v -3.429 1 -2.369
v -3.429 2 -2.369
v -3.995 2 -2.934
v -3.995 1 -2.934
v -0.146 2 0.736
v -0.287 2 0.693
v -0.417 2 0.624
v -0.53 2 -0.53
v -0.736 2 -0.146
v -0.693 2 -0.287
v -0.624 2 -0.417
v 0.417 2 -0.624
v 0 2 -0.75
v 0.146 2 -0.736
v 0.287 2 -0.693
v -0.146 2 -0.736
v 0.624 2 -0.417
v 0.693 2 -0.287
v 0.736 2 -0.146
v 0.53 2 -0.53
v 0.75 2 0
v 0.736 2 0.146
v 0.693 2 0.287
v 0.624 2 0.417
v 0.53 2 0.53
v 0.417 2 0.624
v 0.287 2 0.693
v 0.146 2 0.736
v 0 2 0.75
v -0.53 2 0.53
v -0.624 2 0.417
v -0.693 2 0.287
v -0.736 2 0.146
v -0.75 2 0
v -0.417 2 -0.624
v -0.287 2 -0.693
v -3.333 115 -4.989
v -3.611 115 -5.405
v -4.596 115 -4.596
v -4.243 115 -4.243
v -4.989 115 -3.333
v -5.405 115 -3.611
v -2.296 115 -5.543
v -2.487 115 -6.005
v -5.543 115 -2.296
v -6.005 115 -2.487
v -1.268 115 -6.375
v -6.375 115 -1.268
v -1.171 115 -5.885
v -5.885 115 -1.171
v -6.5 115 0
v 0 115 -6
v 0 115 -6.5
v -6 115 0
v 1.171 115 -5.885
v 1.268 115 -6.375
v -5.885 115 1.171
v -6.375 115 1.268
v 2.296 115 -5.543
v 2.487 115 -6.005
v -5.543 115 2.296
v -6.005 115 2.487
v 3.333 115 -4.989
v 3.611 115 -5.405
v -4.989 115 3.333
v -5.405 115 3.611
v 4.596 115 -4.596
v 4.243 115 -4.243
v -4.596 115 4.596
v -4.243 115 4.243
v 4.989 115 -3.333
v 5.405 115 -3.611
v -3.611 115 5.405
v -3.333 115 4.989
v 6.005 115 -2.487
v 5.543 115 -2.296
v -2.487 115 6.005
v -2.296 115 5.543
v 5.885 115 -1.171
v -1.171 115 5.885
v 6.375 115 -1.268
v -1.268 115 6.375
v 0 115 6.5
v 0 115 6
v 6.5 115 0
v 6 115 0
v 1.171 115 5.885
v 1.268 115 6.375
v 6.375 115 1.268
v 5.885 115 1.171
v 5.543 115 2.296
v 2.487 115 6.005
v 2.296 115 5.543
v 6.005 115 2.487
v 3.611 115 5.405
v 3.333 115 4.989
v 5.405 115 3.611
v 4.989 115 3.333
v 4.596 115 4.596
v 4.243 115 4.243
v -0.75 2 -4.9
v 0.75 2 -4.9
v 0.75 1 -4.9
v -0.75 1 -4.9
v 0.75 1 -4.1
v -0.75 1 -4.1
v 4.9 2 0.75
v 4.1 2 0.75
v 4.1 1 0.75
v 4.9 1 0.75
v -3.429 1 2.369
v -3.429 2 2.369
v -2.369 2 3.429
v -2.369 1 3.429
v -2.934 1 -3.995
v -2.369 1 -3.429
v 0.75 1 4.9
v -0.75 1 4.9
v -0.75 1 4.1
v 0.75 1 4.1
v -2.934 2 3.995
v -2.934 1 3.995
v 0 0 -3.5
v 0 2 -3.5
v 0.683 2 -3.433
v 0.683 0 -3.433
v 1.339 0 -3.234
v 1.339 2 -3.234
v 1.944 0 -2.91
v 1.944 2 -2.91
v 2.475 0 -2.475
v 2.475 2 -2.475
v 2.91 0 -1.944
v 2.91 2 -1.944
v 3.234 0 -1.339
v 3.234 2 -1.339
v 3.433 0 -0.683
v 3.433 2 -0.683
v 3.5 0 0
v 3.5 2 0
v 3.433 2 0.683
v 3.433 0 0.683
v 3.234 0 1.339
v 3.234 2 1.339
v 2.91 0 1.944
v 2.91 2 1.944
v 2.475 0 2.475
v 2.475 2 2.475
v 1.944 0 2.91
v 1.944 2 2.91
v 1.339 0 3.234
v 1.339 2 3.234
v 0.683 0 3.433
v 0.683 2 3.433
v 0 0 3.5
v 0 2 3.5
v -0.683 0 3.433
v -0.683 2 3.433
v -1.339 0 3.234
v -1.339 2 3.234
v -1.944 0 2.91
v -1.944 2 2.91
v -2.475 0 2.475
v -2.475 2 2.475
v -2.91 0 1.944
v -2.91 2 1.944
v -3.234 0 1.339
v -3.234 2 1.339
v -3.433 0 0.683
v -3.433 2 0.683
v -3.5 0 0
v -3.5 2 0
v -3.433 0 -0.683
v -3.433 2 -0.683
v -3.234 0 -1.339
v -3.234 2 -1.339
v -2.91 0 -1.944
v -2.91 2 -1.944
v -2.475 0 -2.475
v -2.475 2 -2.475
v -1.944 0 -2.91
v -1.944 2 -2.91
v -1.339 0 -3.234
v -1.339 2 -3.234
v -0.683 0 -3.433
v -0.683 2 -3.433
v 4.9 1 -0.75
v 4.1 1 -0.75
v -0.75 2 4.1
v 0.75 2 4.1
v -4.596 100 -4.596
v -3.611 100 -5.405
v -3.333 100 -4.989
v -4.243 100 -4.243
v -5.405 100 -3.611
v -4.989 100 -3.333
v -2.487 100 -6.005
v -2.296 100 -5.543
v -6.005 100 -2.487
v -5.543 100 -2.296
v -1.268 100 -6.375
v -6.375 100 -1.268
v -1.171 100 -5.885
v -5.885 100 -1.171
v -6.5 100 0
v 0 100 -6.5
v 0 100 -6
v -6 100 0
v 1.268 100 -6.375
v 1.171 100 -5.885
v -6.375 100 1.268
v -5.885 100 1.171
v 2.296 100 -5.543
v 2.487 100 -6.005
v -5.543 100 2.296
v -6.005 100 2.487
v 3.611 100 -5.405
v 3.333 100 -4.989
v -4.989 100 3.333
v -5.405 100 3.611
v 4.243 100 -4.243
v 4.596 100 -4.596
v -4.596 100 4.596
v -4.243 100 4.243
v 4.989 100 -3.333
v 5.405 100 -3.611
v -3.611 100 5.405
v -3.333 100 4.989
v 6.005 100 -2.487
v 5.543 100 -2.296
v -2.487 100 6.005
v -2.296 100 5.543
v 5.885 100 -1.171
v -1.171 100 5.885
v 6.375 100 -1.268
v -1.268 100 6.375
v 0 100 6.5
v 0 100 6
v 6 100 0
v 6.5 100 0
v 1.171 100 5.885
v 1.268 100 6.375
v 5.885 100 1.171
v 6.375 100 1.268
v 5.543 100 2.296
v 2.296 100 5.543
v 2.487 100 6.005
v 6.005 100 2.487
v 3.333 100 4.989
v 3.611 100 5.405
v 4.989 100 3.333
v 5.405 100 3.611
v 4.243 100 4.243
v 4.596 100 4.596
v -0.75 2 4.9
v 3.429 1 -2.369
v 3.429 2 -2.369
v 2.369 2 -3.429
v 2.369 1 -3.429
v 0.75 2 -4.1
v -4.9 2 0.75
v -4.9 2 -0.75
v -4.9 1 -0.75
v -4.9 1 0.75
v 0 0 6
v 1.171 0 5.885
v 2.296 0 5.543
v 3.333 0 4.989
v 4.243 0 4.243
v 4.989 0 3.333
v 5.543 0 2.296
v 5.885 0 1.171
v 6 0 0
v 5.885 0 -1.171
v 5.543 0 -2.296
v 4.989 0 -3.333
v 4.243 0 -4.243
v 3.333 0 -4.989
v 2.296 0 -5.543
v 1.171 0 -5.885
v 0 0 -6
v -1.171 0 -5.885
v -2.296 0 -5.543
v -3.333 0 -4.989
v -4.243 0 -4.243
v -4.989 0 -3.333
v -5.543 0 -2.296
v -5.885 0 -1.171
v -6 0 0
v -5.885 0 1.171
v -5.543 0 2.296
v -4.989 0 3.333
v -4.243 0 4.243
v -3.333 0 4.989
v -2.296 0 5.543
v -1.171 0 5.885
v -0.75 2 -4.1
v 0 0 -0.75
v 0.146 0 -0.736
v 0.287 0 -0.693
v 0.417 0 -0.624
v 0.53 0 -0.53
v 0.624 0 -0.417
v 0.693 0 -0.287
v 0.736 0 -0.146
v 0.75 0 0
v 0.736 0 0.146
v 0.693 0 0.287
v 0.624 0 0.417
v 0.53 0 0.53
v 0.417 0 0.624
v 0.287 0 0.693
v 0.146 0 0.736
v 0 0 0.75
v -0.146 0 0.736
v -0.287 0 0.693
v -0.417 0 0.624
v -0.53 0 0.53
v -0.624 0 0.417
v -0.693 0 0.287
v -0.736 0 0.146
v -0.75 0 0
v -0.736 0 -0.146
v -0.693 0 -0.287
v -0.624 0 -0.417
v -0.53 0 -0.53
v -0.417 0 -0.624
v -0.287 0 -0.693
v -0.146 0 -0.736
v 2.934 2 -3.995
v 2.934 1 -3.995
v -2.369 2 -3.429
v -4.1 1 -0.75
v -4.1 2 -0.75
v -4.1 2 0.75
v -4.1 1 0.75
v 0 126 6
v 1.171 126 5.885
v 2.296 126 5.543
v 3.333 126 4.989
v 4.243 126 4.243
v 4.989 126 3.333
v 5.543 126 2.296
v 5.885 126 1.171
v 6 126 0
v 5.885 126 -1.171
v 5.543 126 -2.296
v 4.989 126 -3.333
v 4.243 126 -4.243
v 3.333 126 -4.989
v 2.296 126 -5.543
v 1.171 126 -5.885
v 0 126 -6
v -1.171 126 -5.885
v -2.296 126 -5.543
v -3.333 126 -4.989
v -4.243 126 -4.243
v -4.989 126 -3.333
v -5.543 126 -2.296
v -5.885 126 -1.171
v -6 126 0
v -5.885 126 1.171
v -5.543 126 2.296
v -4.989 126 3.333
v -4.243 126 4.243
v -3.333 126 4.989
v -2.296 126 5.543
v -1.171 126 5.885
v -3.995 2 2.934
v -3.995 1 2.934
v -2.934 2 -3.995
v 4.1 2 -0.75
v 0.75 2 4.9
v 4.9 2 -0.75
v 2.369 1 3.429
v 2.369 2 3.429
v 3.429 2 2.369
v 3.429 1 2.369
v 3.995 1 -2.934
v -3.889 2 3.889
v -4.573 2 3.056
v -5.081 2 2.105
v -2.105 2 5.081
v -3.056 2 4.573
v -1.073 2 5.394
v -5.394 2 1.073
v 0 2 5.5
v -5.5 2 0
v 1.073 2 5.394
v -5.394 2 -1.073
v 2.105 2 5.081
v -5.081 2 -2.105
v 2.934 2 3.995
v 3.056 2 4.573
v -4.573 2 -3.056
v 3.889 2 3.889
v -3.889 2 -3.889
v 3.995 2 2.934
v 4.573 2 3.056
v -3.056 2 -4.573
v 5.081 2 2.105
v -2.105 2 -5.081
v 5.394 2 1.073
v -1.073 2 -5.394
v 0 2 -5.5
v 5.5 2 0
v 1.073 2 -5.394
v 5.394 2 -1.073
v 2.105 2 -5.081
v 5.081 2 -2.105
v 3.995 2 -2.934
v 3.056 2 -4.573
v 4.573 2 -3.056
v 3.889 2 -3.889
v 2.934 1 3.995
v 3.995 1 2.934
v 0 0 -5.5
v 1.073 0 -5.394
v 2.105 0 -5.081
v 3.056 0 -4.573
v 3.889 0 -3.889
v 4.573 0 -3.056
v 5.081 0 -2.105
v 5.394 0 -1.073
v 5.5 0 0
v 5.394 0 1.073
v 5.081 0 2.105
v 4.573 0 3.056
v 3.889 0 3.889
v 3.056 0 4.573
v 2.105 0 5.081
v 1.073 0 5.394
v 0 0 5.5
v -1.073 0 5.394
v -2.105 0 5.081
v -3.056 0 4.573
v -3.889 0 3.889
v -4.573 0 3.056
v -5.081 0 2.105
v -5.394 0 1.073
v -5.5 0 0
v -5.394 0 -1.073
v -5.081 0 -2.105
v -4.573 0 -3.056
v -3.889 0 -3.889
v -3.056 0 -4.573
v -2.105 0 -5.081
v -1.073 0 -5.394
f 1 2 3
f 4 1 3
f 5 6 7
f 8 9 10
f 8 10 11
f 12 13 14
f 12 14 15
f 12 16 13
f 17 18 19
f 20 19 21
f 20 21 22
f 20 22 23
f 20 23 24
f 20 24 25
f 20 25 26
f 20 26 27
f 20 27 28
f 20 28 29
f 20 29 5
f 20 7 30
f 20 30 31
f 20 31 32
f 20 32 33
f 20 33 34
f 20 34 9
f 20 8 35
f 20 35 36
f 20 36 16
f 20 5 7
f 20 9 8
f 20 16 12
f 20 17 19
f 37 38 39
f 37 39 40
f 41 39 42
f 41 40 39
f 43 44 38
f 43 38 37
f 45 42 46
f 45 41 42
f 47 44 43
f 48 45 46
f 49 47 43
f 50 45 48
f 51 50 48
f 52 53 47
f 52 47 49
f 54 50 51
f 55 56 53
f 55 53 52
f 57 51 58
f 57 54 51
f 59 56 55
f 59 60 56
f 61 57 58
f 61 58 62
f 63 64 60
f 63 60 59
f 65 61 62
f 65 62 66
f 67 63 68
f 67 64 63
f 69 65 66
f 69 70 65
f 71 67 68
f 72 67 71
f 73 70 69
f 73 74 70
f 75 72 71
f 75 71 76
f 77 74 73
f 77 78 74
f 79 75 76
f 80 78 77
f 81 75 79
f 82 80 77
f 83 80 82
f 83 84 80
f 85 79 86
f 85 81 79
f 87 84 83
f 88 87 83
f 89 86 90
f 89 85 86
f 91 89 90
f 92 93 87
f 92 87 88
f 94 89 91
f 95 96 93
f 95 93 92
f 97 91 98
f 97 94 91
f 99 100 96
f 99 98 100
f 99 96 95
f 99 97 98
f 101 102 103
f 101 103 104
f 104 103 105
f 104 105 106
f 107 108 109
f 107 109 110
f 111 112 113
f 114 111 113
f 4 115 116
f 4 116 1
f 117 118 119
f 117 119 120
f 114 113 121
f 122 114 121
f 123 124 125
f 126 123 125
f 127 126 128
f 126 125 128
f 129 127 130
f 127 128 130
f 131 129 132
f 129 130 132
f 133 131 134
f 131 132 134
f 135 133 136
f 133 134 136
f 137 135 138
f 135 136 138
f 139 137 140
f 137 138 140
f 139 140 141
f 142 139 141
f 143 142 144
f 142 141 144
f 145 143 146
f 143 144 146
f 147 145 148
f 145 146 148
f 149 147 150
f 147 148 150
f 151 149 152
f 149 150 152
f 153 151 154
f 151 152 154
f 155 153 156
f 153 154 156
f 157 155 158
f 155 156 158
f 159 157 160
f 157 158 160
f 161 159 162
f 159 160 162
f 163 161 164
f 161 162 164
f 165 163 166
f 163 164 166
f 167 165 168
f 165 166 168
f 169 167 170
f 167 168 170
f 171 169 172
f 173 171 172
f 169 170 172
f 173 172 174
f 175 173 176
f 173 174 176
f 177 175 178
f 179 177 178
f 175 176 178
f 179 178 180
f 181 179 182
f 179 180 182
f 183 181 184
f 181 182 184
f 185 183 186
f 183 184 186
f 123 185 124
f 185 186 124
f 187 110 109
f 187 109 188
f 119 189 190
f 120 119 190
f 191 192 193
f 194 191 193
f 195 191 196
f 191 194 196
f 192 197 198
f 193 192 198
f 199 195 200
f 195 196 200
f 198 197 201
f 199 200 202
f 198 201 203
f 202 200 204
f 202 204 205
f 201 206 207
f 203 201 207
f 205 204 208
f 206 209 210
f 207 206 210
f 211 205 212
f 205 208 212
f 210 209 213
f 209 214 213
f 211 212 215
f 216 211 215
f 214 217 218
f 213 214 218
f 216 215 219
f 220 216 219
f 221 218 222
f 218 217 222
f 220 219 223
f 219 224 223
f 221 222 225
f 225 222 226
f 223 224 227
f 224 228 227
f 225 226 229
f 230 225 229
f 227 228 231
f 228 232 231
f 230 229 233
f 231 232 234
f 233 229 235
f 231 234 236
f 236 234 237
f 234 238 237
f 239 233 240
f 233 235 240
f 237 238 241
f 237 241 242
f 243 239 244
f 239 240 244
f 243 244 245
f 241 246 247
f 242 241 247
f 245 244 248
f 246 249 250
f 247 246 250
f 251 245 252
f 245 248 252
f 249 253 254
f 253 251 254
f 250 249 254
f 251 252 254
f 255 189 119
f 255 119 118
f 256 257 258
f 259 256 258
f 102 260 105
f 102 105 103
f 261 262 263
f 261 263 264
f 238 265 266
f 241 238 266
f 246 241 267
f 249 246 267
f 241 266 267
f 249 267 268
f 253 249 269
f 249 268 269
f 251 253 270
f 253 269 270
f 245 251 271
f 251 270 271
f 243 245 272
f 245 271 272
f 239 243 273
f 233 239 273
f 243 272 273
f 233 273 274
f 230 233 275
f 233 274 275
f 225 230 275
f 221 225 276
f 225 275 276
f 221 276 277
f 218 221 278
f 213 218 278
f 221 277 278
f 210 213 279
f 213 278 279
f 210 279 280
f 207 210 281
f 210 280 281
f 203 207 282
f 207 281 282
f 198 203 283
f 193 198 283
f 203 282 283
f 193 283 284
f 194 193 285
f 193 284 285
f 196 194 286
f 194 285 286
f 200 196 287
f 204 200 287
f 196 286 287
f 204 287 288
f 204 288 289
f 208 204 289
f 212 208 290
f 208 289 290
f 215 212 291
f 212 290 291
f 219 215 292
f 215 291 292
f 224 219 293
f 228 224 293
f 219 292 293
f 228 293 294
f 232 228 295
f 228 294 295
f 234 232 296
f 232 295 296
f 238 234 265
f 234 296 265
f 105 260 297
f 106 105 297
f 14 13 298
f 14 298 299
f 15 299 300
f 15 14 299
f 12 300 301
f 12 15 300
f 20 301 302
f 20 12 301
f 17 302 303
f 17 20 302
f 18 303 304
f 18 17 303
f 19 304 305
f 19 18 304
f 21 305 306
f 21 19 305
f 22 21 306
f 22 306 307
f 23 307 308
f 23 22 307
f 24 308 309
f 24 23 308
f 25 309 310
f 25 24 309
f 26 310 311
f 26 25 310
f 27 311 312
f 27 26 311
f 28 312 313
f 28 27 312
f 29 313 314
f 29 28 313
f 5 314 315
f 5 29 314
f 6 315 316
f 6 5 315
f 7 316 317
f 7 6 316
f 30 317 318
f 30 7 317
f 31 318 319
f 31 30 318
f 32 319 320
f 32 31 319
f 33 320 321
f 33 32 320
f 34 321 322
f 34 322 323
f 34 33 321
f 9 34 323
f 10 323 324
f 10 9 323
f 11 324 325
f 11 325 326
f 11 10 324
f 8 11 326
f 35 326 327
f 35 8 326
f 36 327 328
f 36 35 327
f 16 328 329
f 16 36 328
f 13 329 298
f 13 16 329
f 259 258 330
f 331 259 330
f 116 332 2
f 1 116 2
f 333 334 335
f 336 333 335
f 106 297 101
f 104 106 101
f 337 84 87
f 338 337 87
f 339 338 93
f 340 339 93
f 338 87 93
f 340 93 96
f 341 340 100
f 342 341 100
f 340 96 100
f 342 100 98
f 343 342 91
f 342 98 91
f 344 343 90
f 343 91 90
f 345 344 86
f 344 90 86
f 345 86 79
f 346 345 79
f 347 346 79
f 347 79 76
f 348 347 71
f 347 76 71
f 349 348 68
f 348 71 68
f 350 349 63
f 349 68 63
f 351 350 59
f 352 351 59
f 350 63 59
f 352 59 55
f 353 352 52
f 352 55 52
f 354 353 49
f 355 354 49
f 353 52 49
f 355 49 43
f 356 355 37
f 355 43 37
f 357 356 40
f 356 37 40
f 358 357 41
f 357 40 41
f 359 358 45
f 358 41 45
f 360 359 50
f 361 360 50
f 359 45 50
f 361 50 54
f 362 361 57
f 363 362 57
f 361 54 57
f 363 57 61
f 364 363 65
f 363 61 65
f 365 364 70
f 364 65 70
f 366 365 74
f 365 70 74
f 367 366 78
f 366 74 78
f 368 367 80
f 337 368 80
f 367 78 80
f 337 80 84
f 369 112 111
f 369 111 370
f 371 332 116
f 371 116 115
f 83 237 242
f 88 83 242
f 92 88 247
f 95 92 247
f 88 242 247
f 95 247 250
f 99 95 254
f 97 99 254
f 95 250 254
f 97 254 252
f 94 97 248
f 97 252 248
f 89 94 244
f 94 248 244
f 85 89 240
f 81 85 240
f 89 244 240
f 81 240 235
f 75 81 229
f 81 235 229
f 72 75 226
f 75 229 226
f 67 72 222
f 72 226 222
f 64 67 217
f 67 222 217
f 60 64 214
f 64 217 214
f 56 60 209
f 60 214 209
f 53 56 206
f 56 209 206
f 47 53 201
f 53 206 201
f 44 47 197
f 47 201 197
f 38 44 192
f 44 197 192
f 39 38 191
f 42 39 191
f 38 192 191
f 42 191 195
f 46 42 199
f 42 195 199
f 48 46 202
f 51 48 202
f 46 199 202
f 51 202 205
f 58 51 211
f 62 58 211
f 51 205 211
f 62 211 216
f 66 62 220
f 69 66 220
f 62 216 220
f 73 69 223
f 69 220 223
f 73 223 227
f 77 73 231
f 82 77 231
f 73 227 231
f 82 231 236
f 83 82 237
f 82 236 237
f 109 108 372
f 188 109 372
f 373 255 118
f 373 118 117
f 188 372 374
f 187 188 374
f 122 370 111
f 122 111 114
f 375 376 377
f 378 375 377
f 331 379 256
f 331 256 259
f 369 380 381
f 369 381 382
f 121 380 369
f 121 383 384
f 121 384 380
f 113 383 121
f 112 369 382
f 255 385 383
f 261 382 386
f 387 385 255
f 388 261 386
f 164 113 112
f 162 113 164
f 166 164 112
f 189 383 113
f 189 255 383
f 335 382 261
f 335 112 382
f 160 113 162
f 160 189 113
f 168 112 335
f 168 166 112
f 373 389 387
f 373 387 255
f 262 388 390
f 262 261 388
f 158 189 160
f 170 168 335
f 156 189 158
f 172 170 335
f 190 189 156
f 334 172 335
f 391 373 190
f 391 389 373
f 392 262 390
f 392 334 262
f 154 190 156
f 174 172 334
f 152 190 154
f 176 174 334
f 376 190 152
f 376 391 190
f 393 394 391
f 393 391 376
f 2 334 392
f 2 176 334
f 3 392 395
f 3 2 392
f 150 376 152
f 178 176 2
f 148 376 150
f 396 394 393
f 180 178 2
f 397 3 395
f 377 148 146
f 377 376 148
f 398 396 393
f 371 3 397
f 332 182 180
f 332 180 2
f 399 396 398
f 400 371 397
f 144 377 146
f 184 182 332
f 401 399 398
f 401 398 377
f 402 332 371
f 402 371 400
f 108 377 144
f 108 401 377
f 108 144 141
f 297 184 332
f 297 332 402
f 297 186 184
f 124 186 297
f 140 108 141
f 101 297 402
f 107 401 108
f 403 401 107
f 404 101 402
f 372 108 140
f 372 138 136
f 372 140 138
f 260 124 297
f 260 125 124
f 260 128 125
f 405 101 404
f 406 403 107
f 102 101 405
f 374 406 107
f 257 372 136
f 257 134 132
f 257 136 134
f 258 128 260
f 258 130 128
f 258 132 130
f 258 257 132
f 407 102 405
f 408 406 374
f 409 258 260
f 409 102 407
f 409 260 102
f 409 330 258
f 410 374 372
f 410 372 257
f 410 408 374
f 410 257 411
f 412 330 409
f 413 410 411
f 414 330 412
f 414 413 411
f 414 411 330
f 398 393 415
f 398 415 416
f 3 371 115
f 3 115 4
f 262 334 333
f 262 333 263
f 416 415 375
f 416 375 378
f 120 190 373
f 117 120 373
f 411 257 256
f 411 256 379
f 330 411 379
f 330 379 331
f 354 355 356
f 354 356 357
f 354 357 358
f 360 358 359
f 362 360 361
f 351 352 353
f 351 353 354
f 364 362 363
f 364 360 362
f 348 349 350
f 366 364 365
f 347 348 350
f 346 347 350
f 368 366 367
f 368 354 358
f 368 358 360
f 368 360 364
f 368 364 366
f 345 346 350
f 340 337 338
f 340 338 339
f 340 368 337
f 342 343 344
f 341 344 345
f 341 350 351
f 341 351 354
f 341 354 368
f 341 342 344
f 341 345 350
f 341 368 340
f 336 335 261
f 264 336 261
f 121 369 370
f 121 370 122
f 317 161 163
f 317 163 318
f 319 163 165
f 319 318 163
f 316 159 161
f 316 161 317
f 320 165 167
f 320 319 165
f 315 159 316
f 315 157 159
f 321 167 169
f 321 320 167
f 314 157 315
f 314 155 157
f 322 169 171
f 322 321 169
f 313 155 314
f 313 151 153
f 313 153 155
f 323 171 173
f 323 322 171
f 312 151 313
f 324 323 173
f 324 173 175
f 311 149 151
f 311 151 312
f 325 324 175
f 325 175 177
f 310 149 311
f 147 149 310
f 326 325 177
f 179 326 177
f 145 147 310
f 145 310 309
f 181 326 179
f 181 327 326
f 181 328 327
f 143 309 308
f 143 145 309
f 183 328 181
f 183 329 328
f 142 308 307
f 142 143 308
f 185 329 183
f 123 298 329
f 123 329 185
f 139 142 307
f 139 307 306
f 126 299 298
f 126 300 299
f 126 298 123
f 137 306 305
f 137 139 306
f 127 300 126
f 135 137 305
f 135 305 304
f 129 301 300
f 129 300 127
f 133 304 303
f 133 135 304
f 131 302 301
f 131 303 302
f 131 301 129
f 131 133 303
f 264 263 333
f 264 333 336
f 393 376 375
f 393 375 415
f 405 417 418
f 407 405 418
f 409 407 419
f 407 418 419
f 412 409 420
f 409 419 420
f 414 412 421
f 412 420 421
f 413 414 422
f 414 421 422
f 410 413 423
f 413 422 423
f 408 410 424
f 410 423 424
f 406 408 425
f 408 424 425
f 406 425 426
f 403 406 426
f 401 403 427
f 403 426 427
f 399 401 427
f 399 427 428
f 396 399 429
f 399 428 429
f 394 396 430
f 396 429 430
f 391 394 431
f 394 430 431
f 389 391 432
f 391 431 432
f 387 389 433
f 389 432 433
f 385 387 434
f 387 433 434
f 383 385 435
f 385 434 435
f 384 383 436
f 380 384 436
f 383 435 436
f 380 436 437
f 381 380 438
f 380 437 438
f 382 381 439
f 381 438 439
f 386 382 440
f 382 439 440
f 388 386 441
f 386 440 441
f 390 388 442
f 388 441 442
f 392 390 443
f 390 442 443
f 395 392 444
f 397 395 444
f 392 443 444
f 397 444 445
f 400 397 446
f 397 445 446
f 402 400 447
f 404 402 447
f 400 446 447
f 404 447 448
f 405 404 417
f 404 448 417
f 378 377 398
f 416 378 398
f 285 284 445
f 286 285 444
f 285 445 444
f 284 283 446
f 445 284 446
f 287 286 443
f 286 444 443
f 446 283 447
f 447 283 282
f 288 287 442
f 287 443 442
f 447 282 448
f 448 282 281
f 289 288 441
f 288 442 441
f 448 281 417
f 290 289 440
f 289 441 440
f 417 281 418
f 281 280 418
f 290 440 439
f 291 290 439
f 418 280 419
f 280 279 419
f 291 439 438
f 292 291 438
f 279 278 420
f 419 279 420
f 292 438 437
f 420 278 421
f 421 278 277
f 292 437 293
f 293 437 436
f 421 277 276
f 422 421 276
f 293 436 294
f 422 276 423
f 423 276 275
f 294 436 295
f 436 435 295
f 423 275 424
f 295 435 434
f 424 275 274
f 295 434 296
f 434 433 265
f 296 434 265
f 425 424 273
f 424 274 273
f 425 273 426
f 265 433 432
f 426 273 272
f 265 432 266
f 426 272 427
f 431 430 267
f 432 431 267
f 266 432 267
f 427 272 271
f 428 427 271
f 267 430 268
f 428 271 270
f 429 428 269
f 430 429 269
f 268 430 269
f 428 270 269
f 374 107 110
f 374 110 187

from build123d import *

# Parameters (mm, degrees)
SKETCH_1_R               = 6
EXTRUDE_1015_DEPTH       = 100
SKETCH_2_R               = 6.5
EXTRUDE_2_DEPTH          = 15
SKETCH_3_R               = 6
EXTRUDE_3_DEPTH          = 11
SKETCH_4_R               = 5.5
CUT_EXTRUDE_1_DEPTH      = 2
SKETCH_5_R               = 3.5
SKETCH_5_R_2             = 0.75
EXTRUDE_1402_DEPTH       = 2
SKETCH_6_W               = 1.5
SKETCH_6_H               = 0.8
EXTRUDE_1605_DEPTH       = 1
PATTERN_CIRCULAR_1_COUNT = 8


with BuildPart() as part:
    # Эскиз1 → Extrude 1015 (new body)
    with BuildSketch(Plane(origin=(0, 0, 0), x_dir=(1, 0, 0), z_dir=(0, 1, 0))):
        with Locations(Location((0, 0, 0), (0, 0, 270))):
            Circle(SKETCH_1_R)
    extrude(amount=EXTRUDE_1015_DEPTH)

    # Эскиз2 → Бобышка-Вытянуть2 (add)
    with BuildSketch(Plane(origin=(0, 100, 0), x_dir=(1, 0, 0), z_dir=(0, 1, 0))):
        with Locations(Location((0, 0, 0), (0, 0, 270))):
            Circle(SKETCH_2_R)
    extrude(amount=EXTRUDE_2_DEPTH)

    # Эскиз3 → Бобышка-Вытянуть3 (add)
    with BuildSketch(Plane(origin=(0, 115, 0), x_dir=(1, 0, 0), z_dir=(0, 1, 0))):
        with Locations(Location((0, 0, 0), (0, 0, 270))):
            Circle(SKETCH_3_R)
    extrude(amount=EXTRUDE_3_DEPTH)

    # Эскиз4 → Вырез-Вытянуть1 (cut)
    with BuildSketch(Plane.XZ):
        with Locations(Location((0, 0, 0), (0, 0, 270))):
            Circle(SKETCH_4_R)
    extrude(amount=-CUT_EXTRUDE_1_DEPTH, mode=Mode.SUBTRACT)

    # Эскиз5 → Extrude 1402 (add)
    with BuildSketch(Plane.XZ.offset(-2)):
        with Locations(Location((0, 0, 0), (0, 0, 270))):
            Circle(SKETCH_5_R)
        with Locations(Location((0, 0, 0), (0, 0, 270))):
            Circle(SKETCH_5_R_2, mode=Mode.SUBTRACT)
    extrude(amount=EXTRUDE_1402_DEPTH)

    # Эскиз6 → Extrude 1605 (add)
    with BuildSketch(Plane.XZ.offset(-2)):
        with Locations((0, 4.5)):
            Rectangle(SKETCH_6_W, SKETCH_6_H)
    extrude_1605 = extrude(amount=EXTRUDE_1605_DEPTH)

    # Круговой массив1: Extrude 1605 ×8 about axis
    pattern_circular_1_axis = Axis((0, 0, 0), (0, 1, 0))
    for i in range(1, PATTERN_CIRCULAR_1_COUNT):
        add(extrude_1605.rotate(pattern_circular_1_axis, i * 360 / PATTERN_CIRCULAR_1_COUNT))


solid = part.part
